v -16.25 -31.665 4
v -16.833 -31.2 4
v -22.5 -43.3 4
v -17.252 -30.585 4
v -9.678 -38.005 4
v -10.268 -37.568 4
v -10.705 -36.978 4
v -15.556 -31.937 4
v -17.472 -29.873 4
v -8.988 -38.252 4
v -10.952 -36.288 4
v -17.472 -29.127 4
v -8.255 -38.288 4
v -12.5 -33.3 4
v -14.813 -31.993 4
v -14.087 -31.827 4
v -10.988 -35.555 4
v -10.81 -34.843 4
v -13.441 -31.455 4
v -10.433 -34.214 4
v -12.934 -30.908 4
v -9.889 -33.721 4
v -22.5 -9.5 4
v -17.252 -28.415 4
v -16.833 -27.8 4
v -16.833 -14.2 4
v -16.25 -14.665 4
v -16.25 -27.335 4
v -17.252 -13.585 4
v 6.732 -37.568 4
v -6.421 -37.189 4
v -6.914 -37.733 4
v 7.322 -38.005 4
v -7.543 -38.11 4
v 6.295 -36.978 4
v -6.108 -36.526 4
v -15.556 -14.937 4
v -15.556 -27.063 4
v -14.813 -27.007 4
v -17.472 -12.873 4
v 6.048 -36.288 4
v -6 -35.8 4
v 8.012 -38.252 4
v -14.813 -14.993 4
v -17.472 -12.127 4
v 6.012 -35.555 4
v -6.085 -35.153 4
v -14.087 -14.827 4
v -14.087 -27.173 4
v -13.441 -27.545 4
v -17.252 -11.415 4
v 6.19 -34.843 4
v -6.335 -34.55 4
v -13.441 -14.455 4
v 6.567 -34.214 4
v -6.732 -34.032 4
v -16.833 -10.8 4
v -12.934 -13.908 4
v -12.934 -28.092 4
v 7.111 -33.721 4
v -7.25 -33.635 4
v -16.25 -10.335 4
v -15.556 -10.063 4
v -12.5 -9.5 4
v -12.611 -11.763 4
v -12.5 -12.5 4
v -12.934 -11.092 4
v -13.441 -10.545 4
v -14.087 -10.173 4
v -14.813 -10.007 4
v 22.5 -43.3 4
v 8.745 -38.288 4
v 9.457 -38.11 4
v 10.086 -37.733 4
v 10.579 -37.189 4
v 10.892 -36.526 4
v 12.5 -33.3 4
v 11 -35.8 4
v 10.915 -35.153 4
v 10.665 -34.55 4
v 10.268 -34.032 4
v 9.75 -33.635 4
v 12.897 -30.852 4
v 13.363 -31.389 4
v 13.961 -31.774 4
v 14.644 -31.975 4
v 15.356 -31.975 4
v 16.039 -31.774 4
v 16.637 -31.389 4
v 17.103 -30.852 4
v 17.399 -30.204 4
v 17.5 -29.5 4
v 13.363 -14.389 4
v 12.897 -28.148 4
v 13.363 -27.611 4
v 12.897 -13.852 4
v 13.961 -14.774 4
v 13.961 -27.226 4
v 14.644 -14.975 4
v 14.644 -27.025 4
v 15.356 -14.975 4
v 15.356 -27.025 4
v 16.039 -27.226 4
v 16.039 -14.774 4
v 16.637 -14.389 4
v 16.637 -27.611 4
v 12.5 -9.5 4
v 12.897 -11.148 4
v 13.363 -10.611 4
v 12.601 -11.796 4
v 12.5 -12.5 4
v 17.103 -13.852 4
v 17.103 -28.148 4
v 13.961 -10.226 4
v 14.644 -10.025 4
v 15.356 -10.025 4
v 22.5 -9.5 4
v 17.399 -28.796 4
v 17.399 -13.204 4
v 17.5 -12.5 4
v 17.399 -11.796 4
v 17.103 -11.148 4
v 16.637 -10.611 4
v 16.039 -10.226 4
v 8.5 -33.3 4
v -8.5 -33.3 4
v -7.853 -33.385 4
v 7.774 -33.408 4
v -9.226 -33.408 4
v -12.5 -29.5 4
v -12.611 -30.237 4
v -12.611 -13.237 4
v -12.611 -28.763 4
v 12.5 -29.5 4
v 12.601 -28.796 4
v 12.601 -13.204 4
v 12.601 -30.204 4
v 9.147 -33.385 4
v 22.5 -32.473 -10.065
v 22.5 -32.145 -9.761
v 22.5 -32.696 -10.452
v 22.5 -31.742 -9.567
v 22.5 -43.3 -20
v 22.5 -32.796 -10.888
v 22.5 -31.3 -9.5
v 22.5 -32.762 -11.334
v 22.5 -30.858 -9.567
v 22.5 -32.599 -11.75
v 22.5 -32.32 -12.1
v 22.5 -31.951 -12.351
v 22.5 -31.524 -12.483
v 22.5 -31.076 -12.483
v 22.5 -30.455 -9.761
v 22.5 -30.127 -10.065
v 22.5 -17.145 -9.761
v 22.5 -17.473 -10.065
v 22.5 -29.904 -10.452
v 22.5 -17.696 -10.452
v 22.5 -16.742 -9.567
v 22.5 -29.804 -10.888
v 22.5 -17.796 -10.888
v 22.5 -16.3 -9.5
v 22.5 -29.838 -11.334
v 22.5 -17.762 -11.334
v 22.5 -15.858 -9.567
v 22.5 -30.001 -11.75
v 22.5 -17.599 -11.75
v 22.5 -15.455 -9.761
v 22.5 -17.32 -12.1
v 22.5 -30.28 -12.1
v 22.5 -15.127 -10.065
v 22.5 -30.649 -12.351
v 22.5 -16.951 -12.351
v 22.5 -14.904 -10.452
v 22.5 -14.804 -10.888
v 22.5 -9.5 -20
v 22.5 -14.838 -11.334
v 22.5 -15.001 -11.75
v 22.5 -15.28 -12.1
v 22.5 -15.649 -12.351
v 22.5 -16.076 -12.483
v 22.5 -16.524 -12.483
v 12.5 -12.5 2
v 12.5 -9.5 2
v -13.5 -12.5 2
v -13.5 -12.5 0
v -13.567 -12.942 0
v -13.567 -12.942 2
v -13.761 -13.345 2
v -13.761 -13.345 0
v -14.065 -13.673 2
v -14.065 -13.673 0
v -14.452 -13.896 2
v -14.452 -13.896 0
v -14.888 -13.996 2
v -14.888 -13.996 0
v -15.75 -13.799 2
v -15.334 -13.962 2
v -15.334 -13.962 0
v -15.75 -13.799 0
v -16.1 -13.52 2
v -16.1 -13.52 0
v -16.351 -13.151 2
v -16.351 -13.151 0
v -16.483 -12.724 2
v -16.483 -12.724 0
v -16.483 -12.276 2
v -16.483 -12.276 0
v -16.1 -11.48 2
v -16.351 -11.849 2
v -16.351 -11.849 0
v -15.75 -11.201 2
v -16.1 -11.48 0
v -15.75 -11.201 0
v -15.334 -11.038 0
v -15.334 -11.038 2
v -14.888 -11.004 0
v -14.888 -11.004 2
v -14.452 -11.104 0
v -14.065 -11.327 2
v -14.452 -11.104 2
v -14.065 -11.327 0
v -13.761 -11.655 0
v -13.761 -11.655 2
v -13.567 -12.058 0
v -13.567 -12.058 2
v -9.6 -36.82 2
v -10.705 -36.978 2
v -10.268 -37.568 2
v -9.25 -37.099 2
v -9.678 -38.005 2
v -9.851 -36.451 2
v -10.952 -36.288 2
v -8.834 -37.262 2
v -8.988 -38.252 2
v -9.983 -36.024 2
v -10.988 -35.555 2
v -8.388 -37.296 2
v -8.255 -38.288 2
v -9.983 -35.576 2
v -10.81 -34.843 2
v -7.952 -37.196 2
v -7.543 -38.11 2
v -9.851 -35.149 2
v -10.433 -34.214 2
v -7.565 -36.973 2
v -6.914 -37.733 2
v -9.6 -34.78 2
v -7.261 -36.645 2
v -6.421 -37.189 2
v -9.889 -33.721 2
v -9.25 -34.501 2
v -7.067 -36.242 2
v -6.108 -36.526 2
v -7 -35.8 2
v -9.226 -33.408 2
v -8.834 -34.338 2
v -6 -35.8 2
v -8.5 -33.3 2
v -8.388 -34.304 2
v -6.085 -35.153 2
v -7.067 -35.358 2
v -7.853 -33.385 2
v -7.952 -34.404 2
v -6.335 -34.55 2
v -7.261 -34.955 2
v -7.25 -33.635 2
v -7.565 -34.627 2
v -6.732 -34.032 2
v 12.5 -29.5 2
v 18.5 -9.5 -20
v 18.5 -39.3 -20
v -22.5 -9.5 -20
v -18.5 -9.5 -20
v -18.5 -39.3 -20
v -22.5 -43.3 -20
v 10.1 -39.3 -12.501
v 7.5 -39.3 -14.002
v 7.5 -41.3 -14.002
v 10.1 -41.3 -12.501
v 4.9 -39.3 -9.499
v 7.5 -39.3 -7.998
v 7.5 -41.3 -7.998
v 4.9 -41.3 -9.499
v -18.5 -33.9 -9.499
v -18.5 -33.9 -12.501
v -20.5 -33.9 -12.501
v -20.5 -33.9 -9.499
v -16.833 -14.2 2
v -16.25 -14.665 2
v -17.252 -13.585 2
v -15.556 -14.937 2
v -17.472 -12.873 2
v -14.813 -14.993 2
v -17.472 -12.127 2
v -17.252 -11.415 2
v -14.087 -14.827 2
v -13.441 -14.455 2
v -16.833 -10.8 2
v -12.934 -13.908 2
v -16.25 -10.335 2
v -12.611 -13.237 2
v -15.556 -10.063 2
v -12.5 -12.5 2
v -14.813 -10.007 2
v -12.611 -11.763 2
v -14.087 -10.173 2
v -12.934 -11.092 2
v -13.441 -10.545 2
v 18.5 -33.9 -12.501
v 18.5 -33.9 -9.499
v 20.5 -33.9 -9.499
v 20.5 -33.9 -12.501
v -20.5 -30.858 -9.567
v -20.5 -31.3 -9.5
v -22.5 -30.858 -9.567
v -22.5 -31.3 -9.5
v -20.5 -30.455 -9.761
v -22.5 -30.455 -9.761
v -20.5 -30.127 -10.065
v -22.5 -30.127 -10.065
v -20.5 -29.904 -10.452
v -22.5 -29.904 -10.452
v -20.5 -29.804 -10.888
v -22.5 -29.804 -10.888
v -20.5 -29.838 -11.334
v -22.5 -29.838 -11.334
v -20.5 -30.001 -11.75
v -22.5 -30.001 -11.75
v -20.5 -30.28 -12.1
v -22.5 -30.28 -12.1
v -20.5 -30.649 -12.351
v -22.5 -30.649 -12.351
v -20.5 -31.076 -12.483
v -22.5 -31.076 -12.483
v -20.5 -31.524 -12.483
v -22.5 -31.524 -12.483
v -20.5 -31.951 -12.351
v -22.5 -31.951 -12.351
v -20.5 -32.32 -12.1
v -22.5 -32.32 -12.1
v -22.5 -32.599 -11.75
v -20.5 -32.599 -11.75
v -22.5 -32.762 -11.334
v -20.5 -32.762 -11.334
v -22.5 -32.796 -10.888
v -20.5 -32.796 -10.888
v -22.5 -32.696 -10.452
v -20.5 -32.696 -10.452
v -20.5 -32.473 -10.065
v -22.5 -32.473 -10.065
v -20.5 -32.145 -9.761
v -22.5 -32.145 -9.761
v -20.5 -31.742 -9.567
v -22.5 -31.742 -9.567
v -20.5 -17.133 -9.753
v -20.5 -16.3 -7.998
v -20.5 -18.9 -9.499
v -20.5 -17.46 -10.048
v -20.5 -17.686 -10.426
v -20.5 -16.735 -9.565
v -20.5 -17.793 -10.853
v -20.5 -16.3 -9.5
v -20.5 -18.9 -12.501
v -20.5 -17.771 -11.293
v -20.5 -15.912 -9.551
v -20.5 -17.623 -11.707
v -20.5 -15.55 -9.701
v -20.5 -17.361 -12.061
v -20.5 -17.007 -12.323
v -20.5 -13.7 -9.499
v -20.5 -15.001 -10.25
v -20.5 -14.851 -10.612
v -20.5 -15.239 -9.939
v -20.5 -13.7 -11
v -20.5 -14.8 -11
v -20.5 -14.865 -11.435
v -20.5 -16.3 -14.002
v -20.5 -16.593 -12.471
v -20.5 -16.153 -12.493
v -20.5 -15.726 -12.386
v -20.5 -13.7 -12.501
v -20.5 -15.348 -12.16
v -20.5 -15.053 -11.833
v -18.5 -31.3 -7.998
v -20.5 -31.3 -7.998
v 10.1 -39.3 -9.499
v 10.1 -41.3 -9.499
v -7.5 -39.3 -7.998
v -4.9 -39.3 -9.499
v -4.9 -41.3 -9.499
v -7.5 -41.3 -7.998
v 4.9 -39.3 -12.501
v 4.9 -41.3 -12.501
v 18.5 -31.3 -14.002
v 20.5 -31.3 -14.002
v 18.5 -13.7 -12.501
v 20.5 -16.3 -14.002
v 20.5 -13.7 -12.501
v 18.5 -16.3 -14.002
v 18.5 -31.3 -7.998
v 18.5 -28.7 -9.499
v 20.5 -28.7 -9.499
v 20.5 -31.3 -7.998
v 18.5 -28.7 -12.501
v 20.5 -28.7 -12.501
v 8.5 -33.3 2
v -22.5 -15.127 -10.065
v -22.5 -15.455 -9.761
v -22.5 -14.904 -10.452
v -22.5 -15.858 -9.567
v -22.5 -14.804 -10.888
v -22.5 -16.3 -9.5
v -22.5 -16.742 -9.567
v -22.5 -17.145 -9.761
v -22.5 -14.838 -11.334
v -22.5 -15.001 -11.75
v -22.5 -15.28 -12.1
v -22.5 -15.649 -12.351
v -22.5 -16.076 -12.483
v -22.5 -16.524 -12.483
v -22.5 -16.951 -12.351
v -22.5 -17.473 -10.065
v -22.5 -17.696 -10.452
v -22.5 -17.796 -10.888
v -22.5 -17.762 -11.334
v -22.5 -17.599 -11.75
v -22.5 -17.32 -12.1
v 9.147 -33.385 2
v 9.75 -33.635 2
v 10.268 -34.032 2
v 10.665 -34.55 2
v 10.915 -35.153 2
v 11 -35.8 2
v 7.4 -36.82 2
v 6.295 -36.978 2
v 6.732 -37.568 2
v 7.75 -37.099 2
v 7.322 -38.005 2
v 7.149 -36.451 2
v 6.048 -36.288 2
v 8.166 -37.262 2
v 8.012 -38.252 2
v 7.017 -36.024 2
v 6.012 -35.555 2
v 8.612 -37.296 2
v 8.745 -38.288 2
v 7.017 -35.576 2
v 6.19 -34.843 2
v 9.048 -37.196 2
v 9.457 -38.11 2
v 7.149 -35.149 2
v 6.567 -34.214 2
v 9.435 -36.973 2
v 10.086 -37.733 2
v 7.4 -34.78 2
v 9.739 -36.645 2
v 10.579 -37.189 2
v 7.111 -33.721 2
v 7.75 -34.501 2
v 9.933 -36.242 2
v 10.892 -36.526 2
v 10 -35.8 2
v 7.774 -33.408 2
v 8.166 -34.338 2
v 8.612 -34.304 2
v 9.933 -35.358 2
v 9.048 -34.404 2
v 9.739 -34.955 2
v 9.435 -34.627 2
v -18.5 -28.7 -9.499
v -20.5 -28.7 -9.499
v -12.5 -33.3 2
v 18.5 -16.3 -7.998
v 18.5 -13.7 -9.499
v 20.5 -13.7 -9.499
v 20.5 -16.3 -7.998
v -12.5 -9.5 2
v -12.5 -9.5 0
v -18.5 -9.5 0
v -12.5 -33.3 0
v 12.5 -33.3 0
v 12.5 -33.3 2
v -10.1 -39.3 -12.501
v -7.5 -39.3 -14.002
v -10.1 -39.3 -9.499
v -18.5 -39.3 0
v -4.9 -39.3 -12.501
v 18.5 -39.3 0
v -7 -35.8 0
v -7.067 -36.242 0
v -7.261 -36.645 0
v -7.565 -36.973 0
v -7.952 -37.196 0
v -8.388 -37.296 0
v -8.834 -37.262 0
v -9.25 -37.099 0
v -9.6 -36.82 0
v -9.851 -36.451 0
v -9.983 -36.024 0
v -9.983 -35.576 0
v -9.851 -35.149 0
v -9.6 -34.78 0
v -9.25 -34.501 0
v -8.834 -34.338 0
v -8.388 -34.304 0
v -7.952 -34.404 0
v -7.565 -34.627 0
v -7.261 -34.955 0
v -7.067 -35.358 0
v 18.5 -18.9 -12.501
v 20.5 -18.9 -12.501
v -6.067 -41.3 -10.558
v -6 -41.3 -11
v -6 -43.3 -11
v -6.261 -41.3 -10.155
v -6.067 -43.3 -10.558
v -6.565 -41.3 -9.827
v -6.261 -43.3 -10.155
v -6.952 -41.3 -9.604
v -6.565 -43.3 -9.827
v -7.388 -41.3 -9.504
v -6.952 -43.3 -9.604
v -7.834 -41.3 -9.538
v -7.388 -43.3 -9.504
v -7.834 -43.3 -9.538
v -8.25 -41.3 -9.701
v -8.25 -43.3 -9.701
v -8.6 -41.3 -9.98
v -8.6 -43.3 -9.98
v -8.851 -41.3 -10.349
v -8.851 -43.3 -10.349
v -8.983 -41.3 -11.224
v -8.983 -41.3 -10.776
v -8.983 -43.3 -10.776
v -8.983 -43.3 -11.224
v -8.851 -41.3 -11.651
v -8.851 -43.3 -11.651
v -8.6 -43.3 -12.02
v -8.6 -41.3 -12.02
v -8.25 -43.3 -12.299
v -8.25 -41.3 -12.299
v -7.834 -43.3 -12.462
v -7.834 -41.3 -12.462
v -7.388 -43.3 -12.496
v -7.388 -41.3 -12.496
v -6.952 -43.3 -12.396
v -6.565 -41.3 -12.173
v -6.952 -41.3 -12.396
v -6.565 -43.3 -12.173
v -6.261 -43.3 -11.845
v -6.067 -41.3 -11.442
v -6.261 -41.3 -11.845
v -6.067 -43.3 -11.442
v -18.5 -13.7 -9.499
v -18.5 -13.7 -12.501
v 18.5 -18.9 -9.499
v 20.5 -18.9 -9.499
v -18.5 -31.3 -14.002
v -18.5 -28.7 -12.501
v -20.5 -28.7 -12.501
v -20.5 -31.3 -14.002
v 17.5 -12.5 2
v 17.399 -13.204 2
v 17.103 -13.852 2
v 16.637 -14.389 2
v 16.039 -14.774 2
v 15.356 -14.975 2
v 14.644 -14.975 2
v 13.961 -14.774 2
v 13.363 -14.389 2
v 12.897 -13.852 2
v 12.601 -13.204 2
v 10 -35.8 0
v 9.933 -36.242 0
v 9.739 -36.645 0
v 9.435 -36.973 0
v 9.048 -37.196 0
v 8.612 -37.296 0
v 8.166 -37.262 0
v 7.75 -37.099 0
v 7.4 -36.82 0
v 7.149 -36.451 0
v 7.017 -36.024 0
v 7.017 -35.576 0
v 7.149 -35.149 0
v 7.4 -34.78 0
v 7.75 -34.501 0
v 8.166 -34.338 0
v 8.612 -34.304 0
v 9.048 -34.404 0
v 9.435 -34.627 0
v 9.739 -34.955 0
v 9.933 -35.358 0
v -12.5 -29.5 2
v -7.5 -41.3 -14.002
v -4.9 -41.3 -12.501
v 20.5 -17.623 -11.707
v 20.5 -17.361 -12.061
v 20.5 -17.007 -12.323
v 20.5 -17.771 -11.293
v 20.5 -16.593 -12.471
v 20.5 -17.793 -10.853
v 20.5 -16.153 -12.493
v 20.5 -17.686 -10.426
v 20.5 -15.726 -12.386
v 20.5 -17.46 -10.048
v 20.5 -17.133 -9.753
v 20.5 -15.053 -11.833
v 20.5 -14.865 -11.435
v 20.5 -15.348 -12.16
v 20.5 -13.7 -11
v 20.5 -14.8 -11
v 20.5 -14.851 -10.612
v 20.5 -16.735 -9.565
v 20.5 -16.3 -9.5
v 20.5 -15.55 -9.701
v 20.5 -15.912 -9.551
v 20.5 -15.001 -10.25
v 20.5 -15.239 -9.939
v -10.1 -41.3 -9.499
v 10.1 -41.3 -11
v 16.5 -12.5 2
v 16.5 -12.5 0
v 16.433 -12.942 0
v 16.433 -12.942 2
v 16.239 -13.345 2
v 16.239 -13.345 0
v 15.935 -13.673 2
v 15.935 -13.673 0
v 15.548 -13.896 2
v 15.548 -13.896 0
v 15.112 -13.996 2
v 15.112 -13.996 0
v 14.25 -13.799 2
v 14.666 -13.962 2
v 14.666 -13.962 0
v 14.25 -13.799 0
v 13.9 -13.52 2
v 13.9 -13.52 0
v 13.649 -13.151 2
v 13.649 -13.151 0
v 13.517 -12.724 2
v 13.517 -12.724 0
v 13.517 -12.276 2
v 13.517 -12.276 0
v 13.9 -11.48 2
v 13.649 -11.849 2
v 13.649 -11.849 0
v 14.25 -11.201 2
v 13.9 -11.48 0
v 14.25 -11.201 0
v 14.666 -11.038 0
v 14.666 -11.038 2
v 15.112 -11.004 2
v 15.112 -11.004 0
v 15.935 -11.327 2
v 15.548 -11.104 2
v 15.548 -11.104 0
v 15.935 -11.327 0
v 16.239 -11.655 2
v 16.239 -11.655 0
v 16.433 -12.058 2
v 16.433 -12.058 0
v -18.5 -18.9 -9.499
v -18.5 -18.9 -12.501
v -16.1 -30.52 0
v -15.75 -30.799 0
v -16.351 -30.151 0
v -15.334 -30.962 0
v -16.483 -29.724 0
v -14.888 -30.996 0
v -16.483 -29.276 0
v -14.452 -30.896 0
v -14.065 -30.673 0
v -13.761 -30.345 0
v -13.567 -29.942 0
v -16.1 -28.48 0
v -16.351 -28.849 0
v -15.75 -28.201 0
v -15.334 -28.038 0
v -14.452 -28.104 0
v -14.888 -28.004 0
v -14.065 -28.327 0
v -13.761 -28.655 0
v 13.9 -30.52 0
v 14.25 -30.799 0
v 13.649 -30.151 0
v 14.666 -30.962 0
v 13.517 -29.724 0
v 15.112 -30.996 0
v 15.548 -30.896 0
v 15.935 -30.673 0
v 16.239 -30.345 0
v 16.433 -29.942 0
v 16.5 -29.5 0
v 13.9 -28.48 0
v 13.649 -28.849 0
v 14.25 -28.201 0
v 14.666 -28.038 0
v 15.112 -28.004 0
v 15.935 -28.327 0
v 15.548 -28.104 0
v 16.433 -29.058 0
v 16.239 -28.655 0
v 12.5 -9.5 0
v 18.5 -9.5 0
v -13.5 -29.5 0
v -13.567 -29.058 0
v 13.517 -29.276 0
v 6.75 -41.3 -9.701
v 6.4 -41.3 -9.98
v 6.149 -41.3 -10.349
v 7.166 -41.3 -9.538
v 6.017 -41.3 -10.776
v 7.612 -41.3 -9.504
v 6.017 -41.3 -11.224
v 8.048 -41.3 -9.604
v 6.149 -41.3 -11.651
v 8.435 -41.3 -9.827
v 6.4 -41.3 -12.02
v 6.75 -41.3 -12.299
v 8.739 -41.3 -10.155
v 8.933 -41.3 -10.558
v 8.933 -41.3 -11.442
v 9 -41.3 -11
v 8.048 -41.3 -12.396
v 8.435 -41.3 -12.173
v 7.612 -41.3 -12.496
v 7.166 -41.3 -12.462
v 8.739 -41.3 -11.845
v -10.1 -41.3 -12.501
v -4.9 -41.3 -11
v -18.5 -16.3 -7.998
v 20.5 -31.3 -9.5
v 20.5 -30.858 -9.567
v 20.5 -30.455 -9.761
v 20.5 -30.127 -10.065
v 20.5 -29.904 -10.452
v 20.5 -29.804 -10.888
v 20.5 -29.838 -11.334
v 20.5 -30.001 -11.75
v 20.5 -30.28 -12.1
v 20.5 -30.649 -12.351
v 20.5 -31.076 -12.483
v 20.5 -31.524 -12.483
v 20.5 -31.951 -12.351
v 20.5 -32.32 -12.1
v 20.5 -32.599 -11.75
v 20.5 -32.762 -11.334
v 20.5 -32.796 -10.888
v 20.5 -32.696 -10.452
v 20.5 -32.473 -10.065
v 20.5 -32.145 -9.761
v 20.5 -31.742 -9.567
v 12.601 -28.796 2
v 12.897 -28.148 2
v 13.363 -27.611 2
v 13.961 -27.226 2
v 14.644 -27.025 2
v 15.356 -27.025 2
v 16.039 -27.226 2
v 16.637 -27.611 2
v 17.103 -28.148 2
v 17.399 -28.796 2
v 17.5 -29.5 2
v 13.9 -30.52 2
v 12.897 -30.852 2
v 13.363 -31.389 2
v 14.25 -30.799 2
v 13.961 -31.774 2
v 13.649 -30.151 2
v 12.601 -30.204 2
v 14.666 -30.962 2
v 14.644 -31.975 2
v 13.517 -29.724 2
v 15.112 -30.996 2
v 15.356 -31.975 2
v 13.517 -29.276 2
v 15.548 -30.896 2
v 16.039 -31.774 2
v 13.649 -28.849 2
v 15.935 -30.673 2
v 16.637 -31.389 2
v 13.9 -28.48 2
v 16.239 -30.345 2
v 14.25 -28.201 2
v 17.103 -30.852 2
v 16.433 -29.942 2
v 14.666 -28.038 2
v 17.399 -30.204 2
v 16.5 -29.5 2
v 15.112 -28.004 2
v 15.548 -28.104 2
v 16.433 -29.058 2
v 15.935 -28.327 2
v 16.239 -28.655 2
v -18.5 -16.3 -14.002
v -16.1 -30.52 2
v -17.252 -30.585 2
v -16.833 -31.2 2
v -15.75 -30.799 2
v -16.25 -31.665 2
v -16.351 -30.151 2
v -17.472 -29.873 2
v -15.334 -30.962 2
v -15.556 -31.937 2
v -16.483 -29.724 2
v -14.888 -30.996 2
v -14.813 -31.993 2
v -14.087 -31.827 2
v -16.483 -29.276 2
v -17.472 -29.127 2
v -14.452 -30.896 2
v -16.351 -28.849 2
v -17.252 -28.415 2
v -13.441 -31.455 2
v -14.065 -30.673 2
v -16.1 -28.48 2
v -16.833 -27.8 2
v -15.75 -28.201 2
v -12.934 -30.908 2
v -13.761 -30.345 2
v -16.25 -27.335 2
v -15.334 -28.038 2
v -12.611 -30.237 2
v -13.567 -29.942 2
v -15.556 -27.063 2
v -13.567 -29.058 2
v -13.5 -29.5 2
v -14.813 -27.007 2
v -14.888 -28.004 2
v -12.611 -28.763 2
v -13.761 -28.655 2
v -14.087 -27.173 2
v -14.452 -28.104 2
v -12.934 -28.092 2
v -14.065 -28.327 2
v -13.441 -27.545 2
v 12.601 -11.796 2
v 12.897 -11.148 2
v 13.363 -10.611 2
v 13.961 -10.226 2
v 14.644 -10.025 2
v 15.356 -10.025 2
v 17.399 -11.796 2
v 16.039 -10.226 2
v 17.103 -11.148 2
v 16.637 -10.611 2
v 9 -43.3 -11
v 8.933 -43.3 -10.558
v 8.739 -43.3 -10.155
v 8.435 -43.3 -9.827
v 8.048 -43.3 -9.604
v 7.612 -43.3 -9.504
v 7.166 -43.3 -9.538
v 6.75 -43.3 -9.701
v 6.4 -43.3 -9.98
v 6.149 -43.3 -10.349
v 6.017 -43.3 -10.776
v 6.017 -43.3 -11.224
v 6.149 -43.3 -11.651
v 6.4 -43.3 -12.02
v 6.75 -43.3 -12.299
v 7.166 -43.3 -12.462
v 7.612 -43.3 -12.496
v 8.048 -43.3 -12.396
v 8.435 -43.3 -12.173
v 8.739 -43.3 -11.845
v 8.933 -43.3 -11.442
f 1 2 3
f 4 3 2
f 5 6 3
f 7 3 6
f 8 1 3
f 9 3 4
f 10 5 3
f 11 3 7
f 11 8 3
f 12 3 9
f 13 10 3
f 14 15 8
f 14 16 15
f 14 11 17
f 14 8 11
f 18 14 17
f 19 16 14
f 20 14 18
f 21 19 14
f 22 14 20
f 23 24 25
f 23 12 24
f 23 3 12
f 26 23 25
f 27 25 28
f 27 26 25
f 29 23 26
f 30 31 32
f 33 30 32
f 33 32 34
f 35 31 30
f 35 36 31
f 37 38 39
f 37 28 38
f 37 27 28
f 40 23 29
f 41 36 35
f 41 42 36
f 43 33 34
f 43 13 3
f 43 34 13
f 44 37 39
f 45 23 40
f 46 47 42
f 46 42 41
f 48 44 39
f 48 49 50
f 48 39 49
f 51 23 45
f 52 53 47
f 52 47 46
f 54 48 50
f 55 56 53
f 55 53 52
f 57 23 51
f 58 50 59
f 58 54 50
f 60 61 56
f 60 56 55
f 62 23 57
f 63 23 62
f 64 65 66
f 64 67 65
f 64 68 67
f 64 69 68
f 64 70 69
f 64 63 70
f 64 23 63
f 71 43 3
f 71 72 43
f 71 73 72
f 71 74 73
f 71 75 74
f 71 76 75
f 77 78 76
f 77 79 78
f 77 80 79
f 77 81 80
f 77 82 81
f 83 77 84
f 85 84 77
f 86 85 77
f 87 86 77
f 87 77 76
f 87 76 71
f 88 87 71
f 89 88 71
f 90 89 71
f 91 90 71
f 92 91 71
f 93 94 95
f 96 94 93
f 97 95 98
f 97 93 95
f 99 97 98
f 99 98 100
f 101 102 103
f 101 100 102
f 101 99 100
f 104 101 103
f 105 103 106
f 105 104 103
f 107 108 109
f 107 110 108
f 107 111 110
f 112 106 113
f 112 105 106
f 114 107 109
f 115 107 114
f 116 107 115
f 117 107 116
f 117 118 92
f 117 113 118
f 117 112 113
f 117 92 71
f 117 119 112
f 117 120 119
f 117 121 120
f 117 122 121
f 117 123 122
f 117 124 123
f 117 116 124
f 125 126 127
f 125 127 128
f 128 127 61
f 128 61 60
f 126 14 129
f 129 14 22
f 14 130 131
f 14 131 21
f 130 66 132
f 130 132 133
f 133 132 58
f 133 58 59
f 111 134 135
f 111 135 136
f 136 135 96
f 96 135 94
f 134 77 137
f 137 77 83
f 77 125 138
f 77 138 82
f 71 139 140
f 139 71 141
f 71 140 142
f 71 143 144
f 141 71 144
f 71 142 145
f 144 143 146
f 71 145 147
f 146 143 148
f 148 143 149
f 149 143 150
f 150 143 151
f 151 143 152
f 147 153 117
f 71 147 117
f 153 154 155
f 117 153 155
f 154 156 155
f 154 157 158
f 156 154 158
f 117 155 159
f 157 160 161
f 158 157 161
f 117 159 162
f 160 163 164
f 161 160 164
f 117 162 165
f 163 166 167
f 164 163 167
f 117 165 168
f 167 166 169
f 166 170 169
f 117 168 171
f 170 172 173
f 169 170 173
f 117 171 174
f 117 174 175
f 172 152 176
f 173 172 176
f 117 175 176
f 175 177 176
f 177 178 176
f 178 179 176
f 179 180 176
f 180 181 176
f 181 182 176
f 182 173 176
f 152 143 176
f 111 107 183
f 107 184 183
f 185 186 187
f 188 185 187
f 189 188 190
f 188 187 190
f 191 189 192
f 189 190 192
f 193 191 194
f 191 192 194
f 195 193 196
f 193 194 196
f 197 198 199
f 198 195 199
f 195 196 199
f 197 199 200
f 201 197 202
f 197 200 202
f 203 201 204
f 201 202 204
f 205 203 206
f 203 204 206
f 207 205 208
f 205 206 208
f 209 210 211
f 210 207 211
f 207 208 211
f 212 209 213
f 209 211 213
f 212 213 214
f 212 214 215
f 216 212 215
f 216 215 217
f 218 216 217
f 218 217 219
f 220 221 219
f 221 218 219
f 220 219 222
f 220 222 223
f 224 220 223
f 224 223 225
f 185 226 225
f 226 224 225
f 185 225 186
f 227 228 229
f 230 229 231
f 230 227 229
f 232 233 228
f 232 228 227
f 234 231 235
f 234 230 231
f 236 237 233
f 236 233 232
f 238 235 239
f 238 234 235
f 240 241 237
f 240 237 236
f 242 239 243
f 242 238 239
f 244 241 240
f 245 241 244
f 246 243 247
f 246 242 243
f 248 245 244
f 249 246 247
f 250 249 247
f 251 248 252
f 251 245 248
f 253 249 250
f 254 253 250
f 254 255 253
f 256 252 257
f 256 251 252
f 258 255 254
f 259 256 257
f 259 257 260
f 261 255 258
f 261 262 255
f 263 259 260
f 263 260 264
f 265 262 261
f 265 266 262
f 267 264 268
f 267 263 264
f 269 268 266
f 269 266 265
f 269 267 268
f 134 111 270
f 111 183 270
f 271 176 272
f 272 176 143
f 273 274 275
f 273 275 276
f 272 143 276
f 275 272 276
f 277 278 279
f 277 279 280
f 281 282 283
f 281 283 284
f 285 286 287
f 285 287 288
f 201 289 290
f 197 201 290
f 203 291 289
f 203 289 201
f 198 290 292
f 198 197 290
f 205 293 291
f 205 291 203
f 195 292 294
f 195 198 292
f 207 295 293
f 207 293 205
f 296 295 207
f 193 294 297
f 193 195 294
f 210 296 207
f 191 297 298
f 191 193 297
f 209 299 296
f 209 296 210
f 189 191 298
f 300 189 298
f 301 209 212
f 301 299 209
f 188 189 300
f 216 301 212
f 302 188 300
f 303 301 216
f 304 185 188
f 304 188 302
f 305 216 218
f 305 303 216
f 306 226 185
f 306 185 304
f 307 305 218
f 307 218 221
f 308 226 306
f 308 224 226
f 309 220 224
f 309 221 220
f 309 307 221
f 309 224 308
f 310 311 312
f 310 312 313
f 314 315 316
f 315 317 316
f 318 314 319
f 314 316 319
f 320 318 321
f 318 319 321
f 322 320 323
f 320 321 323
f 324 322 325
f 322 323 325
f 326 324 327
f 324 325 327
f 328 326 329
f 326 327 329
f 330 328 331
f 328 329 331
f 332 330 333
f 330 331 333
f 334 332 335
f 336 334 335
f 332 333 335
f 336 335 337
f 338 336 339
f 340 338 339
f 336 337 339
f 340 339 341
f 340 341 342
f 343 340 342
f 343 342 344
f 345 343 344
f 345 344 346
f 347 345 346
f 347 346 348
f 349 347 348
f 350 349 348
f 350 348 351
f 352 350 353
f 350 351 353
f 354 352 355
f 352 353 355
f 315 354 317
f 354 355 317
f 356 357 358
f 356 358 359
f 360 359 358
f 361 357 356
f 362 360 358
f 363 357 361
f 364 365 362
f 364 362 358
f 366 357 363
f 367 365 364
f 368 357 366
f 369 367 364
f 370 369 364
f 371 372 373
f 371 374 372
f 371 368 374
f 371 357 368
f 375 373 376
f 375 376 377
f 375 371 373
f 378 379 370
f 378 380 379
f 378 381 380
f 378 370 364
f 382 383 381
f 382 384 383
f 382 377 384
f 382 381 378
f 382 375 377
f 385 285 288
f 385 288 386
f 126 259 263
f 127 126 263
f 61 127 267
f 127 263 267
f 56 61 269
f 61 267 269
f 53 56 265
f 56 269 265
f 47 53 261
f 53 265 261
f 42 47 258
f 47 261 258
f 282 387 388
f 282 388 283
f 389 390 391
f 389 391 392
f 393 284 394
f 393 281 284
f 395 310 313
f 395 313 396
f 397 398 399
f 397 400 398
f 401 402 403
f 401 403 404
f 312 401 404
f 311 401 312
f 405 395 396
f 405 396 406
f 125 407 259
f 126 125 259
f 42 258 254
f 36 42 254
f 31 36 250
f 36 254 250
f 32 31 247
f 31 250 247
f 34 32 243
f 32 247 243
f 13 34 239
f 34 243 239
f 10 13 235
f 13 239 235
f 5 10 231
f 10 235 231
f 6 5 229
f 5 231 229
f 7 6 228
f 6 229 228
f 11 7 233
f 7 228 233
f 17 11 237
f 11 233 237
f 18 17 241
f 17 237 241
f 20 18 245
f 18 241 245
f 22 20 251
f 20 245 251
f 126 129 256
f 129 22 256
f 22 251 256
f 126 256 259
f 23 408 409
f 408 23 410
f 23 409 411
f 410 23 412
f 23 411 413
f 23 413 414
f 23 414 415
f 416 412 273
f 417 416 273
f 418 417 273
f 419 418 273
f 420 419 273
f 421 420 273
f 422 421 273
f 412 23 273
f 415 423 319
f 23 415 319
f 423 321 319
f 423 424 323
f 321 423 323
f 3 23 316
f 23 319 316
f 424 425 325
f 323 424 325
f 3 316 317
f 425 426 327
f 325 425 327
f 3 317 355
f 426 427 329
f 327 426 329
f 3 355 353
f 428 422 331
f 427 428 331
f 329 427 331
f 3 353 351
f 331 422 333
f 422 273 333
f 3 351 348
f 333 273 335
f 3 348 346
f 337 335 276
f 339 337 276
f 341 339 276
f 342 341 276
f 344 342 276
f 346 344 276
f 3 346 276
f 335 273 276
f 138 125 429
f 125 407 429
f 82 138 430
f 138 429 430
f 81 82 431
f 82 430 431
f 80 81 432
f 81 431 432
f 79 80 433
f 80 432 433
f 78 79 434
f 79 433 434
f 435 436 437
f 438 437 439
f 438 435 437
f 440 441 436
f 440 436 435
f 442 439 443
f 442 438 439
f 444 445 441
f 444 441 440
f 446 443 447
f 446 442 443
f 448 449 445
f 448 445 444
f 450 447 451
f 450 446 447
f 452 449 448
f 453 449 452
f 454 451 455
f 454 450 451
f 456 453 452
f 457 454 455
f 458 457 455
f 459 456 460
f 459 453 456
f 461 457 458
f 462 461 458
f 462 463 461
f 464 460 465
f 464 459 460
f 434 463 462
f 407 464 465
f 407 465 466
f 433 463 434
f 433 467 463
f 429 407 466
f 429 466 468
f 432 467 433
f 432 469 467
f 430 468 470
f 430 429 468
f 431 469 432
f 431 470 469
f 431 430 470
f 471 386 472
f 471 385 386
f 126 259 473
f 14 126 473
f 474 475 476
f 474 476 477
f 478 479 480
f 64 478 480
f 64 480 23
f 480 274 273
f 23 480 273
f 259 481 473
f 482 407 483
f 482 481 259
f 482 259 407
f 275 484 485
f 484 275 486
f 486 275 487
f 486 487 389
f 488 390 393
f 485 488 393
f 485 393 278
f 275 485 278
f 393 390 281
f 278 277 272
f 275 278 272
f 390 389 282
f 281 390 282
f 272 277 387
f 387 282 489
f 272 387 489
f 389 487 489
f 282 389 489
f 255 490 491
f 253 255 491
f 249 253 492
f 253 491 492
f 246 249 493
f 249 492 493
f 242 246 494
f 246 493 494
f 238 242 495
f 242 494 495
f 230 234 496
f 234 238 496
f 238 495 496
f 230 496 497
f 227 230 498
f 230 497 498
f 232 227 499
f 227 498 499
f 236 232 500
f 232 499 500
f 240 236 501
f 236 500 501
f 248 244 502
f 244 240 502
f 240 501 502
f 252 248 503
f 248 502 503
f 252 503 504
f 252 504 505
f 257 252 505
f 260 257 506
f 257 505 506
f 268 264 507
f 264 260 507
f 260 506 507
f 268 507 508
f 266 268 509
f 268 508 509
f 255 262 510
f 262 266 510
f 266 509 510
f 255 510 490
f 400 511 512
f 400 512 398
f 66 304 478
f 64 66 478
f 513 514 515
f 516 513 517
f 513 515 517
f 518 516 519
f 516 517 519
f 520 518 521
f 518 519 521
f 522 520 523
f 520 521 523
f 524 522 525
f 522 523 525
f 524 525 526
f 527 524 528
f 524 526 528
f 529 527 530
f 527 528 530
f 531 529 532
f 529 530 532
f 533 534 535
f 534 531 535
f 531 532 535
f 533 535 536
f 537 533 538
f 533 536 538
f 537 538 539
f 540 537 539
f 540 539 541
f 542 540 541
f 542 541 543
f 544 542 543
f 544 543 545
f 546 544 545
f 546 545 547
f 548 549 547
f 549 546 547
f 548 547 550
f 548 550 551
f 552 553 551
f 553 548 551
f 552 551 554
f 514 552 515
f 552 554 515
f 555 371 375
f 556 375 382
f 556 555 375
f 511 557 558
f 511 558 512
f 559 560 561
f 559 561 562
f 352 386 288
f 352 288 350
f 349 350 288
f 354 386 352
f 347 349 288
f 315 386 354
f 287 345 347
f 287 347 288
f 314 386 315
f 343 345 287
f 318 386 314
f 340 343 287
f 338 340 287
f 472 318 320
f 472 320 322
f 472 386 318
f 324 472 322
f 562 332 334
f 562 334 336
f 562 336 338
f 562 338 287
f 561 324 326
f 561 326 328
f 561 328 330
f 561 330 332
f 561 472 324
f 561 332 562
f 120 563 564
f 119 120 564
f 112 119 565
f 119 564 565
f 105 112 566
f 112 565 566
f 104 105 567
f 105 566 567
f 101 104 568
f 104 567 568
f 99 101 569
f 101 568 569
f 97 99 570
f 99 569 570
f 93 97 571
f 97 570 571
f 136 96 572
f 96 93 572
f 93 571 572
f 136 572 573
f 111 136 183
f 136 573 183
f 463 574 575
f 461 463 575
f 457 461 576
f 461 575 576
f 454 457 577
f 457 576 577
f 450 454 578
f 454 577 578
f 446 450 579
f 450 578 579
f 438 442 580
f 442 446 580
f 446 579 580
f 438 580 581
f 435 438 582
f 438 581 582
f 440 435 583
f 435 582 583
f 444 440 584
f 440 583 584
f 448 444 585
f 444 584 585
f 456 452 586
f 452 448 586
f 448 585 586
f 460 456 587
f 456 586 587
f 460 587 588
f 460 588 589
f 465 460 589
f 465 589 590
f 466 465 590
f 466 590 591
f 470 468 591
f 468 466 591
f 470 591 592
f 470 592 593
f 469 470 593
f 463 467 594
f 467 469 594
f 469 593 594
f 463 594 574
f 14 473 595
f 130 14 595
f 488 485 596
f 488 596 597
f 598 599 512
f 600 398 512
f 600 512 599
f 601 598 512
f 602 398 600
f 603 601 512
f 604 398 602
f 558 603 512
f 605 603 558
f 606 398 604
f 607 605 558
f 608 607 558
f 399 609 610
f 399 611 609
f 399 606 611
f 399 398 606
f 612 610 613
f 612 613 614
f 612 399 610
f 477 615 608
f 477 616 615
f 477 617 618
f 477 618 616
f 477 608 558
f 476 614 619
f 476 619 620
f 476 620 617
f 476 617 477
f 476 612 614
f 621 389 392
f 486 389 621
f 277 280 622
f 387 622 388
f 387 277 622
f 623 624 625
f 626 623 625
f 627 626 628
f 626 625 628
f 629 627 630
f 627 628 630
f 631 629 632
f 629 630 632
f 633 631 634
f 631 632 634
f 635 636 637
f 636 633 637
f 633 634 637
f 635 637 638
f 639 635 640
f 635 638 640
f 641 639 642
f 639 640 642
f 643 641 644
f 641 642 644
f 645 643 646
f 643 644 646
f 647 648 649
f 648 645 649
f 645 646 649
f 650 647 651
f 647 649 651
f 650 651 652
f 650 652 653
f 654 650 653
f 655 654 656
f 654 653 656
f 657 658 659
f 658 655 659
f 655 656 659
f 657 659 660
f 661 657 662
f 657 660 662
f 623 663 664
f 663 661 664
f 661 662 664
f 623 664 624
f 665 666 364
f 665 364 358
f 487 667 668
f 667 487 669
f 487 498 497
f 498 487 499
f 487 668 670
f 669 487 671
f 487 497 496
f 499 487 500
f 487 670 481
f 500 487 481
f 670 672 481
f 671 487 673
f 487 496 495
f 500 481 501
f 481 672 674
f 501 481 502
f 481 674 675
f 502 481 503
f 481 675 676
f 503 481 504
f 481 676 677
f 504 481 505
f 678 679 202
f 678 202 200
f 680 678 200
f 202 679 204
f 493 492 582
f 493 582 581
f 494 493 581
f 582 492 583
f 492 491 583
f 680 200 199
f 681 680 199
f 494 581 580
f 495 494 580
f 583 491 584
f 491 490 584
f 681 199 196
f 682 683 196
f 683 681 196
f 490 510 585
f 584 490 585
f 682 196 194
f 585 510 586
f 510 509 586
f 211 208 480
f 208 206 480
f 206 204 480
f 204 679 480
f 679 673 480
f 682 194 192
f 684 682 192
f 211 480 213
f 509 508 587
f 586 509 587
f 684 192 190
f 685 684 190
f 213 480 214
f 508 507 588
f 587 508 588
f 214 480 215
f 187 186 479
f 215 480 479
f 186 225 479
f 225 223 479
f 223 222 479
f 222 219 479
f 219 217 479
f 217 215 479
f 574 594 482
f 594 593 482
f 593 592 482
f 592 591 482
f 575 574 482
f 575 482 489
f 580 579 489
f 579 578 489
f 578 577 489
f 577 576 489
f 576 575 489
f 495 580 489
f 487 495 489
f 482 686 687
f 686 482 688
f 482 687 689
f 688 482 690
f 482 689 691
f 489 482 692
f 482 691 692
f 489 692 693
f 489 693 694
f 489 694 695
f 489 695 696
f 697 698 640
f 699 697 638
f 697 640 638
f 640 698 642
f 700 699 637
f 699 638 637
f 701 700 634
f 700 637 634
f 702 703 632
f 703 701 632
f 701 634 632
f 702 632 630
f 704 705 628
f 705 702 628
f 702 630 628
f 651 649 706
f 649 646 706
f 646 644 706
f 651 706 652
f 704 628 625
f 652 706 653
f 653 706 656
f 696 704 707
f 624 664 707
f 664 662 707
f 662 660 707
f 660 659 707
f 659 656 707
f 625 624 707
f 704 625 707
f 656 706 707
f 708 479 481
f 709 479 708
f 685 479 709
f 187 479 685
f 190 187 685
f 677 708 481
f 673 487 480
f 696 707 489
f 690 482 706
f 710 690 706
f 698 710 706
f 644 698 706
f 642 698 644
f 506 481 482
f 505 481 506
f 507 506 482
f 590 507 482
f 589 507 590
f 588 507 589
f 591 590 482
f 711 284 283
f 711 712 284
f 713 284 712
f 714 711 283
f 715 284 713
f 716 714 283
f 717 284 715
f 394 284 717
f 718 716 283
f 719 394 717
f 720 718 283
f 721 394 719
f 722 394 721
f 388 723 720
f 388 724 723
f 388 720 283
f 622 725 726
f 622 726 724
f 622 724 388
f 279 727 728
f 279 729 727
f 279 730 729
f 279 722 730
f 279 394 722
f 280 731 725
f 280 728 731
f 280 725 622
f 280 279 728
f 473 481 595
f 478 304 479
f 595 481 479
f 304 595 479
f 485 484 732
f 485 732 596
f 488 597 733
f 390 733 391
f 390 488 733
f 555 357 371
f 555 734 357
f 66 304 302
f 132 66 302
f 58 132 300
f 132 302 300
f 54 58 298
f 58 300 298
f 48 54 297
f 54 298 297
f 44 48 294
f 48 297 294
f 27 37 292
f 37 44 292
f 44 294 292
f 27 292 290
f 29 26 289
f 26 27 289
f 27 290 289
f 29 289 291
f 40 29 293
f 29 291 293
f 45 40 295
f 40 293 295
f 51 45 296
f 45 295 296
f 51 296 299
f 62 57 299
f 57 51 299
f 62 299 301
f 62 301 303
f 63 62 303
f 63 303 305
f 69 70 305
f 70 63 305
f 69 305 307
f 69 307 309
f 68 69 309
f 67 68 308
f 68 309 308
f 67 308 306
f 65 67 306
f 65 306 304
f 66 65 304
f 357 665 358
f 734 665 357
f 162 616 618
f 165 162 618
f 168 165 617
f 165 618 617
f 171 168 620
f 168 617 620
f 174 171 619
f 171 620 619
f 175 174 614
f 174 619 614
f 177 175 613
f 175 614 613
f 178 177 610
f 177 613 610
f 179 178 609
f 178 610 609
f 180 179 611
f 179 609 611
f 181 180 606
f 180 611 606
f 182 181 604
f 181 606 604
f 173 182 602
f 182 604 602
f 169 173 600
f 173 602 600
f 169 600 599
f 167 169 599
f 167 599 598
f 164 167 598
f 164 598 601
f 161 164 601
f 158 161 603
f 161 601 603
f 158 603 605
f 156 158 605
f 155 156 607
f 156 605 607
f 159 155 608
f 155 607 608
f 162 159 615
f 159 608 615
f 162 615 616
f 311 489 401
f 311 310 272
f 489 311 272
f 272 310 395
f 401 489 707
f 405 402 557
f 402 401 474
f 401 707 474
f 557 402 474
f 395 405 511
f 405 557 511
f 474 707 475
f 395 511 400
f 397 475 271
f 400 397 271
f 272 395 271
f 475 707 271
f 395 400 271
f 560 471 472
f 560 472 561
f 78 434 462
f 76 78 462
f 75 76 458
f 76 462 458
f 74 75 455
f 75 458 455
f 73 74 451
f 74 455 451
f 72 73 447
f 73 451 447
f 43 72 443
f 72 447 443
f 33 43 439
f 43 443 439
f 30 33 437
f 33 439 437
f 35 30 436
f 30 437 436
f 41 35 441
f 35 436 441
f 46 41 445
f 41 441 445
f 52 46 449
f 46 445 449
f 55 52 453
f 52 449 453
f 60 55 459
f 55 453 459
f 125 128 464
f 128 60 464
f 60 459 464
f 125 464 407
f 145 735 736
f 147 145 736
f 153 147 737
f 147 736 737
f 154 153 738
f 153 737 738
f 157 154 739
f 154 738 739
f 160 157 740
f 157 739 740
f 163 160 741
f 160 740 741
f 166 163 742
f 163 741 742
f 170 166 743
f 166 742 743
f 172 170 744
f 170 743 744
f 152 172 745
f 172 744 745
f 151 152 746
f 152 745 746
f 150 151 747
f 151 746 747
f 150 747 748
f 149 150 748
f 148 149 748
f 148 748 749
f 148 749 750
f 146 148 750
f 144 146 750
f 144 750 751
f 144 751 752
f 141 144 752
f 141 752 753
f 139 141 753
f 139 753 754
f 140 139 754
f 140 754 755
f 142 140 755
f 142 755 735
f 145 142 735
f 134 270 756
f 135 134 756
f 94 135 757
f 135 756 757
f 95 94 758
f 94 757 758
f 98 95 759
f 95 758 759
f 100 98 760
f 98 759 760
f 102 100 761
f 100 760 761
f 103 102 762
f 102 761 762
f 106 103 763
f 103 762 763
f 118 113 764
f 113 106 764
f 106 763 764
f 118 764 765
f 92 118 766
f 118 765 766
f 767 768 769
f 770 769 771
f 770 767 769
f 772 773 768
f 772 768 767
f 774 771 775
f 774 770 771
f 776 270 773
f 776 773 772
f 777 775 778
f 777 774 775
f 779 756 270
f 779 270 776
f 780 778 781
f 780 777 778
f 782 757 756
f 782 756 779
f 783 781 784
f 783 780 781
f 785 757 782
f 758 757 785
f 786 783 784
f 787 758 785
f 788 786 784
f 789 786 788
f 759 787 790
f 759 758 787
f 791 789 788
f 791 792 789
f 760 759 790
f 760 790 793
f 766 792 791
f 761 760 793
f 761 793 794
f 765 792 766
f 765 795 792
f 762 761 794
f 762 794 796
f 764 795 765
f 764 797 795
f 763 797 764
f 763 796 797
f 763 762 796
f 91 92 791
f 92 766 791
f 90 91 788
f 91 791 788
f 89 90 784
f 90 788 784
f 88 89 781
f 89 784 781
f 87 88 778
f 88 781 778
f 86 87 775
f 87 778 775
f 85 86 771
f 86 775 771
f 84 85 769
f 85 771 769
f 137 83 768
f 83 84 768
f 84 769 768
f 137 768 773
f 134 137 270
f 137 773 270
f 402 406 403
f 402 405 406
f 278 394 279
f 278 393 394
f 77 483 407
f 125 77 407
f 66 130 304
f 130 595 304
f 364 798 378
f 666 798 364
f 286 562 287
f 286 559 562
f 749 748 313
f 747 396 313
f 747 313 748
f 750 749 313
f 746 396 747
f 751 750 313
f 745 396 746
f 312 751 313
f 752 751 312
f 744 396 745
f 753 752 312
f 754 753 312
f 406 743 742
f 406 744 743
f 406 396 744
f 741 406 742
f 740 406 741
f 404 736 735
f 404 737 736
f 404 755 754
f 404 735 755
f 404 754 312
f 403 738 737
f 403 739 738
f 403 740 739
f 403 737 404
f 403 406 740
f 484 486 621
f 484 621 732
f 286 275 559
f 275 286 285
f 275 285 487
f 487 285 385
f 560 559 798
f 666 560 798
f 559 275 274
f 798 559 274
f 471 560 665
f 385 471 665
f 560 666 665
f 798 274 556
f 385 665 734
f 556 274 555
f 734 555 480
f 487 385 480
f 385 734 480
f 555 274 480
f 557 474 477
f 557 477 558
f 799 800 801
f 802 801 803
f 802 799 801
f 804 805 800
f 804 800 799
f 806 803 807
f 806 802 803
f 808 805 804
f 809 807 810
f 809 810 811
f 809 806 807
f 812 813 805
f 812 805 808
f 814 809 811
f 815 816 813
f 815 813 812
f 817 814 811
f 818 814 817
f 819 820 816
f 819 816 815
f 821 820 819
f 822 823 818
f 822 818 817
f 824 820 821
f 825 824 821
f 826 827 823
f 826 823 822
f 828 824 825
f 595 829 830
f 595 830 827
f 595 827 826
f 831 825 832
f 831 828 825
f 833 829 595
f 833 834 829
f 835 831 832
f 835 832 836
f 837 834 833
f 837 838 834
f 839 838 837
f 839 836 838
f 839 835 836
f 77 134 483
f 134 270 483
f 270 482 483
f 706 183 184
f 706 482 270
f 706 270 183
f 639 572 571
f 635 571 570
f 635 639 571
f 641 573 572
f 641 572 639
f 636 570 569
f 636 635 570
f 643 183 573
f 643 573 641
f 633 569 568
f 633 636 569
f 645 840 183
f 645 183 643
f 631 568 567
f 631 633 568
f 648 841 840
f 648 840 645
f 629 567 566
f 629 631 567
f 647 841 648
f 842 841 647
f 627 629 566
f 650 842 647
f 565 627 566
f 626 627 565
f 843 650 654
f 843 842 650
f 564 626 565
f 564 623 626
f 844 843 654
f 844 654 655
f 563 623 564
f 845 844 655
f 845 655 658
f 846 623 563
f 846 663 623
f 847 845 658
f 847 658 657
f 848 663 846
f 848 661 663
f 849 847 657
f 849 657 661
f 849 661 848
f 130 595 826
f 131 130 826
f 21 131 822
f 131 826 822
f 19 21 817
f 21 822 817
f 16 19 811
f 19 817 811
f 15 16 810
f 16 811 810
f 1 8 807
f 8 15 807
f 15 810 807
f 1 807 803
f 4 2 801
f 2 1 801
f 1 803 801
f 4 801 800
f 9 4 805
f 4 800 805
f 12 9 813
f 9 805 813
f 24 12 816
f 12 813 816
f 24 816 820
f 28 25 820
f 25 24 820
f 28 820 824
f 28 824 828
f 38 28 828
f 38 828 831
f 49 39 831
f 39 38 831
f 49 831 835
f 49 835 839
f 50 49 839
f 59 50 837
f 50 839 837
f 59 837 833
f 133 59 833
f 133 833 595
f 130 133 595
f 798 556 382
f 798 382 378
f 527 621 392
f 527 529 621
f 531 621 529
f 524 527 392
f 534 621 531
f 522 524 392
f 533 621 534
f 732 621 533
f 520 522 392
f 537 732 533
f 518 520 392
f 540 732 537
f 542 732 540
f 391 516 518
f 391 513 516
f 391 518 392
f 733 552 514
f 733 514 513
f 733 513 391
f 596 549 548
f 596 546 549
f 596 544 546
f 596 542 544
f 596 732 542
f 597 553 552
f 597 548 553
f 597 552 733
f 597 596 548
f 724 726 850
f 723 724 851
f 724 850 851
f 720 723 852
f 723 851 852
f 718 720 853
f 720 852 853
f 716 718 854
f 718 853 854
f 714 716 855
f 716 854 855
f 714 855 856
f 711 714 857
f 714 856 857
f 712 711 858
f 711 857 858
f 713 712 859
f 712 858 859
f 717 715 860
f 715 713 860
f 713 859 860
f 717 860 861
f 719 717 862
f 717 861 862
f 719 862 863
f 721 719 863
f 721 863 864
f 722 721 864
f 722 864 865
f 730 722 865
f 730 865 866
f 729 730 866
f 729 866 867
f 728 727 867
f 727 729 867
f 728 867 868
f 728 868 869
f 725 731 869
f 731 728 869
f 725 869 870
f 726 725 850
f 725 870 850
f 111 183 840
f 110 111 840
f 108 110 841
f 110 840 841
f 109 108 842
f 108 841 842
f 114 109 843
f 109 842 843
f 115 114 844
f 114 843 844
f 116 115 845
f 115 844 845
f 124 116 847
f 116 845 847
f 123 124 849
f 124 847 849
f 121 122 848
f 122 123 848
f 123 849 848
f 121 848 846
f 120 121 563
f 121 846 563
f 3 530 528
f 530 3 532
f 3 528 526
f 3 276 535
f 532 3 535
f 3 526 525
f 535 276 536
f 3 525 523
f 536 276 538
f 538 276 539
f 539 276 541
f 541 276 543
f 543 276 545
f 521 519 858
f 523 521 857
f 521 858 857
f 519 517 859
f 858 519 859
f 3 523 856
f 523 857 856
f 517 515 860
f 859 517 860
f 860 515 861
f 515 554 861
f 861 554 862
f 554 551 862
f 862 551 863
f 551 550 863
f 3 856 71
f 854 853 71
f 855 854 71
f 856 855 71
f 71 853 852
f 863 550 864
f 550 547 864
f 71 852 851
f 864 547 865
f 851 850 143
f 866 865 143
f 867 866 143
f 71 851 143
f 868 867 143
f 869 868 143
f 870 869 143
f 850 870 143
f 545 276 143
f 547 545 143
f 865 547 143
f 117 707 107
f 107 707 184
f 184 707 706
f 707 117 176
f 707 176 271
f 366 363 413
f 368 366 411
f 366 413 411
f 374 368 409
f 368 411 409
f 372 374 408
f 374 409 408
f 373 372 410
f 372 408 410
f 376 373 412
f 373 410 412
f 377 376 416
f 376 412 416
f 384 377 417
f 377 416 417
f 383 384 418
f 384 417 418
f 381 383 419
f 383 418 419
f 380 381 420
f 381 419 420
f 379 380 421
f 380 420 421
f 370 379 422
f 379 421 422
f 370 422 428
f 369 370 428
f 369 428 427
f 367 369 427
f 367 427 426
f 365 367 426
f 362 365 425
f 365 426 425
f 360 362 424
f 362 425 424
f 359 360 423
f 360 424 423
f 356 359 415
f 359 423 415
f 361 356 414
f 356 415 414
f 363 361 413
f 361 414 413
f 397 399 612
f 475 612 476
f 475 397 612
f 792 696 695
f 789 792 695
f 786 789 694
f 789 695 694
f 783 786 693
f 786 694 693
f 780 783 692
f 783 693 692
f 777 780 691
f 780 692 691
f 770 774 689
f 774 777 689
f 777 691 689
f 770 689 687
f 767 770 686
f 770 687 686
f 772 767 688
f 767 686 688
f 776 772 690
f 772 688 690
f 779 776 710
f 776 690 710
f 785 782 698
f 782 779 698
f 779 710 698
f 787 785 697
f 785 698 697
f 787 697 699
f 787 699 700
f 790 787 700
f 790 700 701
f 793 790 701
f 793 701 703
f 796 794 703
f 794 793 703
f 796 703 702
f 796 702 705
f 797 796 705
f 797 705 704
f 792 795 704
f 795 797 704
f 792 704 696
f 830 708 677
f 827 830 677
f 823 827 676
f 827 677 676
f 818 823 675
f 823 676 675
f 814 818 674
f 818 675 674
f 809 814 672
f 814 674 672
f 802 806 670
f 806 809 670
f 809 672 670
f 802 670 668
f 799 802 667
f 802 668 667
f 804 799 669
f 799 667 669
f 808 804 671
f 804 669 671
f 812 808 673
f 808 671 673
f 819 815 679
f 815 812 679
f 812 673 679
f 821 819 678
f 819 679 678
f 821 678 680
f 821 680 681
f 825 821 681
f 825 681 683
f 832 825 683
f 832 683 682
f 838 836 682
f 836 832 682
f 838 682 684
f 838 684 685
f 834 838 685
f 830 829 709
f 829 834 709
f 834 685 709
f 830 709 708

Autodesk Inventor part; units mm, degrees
ref_plane "YZ Plane" through (0, 0, 0) normal (1, 0, 0) x (0, 1, 0)
ref_plane "Work Plane1" through (0, 0, 0) normal (0, 0, 1) x (1, 0, 0)
sketch "Sketch1" plane through (0, 0, 0) normal (0, 0, 1) x (1, 0, 0)
  line L0 (-12.7, 12) -> (-9.2, 12) construction
  line L1 (-12.7, 12) -> (-17.8, 6) construction
  line L2 (-17.8, 6) -> (-17.8, -32.6) construction
  line L3 (-17.8, -32.6) -> (-12.7, -38.6) construction
  line L4 (-12.7, -38.6) -> (12.7, -38.6) construction
  line L5 (12.7, -38.6) -> (17.8, -32.6) construction
  line L6 (17.8, -32.6) -> (17.8, 6) construction
  line L7 (17.8, 6) -> (12.7, 12) construction
  line L8 (9.2, 12) -> (12.7, 12) construction
  arc A0 (12.2, 9) -> (9.2, 12) centre (9.2, 9) ccw construction
  line L9 (12.2, -30) -> (12.2, 9) construction
  arc A1 (9.2, -33) -> (12.2, -30) centre (9.2, -30) ccw construction
  line L10 (-9.2, -33) -> (9.2, -33) construction
  arc A2 (-12.2, -30) -> (-9.2, -33) centre (-9.2, -30) ccw construction
  line L11 (-12.2, 9) -> (-12.2, -30) construction
  arc A3 (-9.2, 12) -> (-12.2, 9) centre (-9.2, 9) ccw construction
  circle A4 centre (-15, 4.5) radius 1.35 construction
  circle A5 centre (-15, -12.5) radius 1.35 construction
  circle A6 centre (-8.5, -35.8) radius 1.35 construction
  circle A7 centre (15, 4.5) radius 1.35 construction
  circle A8 centre (15, -12.5) radius 1.35 construction
  circle A9 centre (8.5, -35.8) radius 1.35 construction
  circle A10 centre (-15, -29.5) radius 1.35 construction
  circle A11 centre (15, -29.5) radius 1.35 construction
  line L12 (-15, -12.5) -> (-12.5, -12.5) construction
  line L13 (-12.5, -12.5) -> (-12.5, -9.5) construction
  line L14 (-12.5, -9.5) -> (-15, -9.5) construction
  line L15 (-15, -9.5) -> (-15, -12.5) construction
  line L16 (15, -12.5) -> (12.5, -12.5) construction
  line L17 (12.5, -12.5) -> (12.5, -9.5) construction
  line L18 (12.5, -9.5) -> (15, -9.5) construction
  line L19 (15, -9.5) -> (15, -12.5) construction
  line L20 (-8.5, -35.8) -> (-12.5, -35.8) construction
  line L21 (-12.5, -35.8) -> (-12.5, -33.3) construction
  line L22 (-12.5, -33.3) -> (-8.5, -33.3) construction
  line L23 (-8.5, -33.3) -> (-8.5, -35.8) construction
  line L24 (8.5, -35.8) -> (12.5, -35.8) construction
  line L25 (12.5, -35.8) -> (12.5, -33.3) construction
  line L26 (12.5, -33.3) -> (8.5, -33.3) construction
  line L27 (8.5, -33.3) -> (8.5, -35.8) construction
  line L28 (-12.5, -9.5) -> (-22.5, -9.5)
  line L29 (-22.5, -9.5) -> (-22.5, -33.3)
  line L30 (-22.5, -33.3) -> (-12.5, -33.3)
  line L31 (-12.5, -33.3) -> (-12.5, -9.5)
  line L32 (12.5, -9.5) -> (22.5, -9.5)
  line L33 (22.5, -9.5) -> (22.5, -33.3)
  line L34 (22.5, -33.3) -> (12.5, -33.3)
  line L35 (12.5, -33.3) -> (12.5, -9.5)
  line L36 (-22.5, -33.3) -> (22.5, -33.3)
  line L37 (22.5, -33.3) -> (22.5, -43.3)
  line L38 (22.5, -43.3) -> (-22.5, -43.3)
  line L39 (-22.5, -43.3) -> (-22.5, -33.3)
  circle A12 centre (-15, -12.5) radius 1.5
  circle A13 centre (-15, -29.5) radius 1.5
  circle A14 centre (-8.5, -35.8) radius 1.5
  circle A15 centre (8.5, -35.8) radius 1.5
  circle A16 centre (15, -29.5) radius 1.5
  circle A17 centre (15, -12.5) radius 1.5
  point P0 (0, 0)
  dimension "d0" = 2.5
  dimension "d1" = 3
  dimension "d2" = 2.5
  dimension "d3" = 3
  dimension "d4" = 4
  dimension "d5" = 2.5
  dimension "d6" = 4
  dimension "d7" = 2.5
  dimension "d9" = 10
  dimension "d10" = 10
  dimension "d11" = 10
  dimension "d12" = 3
  dimension "d13" = 3
  dimension "d14" = 3
  dimension "d15" = 3
  dimension "d16" = 3
  dimension "d17" = 3
extrude "Extrusion1" add sketch "Sketch1" along normal blind 2
sketch "Sketch2" plane through (-22.5, -43.3, 0) normal (0, -1, 0) x (1, 0, 0)
  line L0 (0, 0) -> (45, 0) projected
  line L1 (45, 0) -> (45, 2) projected
  line L2 (0, 2) -> (45, 2) projected
  line L3 (0, 0) -> (0, 2) projected
  line L4 (0, 0) -> (45, 0)
  line L5 (45, 0) -> (45, -20)
  line L6 (45, -20) -> (0, -20)
  line L7 (0, -20) -> (0, 0)
  point P0 (22.5, 0)
  dimension "d20" = 20
extrude "Extrusion2" add sketch "Sketch2" against normal blind 4
ref_plane "Work Plane2" through (0, -43.3, 2) normal (-1, 0, 0) x (0, 0, 1)
sketch "Sketch3" plane through (-22.5, -43.3, 2) normal (-1, 0, 0) x (0, 0, 1)
  line L0 (0, 33.8) -> (0, 0) projected
  line L1 (-2, 33.8) -> (0, 33.8) projected
  line L2 (-2, 33.8) -> (-2, 4) projected
  line L3 (-22, 4) -> (-2, 4) projected
  line L4 (-22, 0) -> (-22, 4) projected
  line L5 (-22, 0) -> (0, 0) projected
  line L6 (-2, 33.8) -> (-2, 4) projected
  line L7 (-2, 4) -> (-22, 4)
  line L8 (-22, 4) -> (-22, 33.8)
  line L9 (-22, 33.8) -> (-2, 33.8)
  line L10 (-2, 33.8) -> (-2, 4)
  point P0 (-2, 43.3)
extrude "Extrusion3" add sketch "Sketch3" against normal blind 4
mirror "Mirror1" about plane through (0, -43.3, 2) normal (-1, 0, 0) of "Extrusion3"
sketch "Sketch4" plane through (0, 0, 2) normal (0, 0, 1) x (1, 0, 0)
  line L0 (22.5, -9.5) -> (12.5, -9.5) projected
  line L1 (12.5, -9.5) -> (12.5, -33.3) projected
  line L2 (12.5, -33.3) -> (-12.5, -33.3) projected
  line L3 (-12.5, -33.3) -> (-12.5, -9.5) projected
  line L4 (-12.5, -9.5) -> (-22.5, -9.5) projected
  line L5 (-22.5, -9.5) -> (-22.5, -43.3) projected
  line L6 (-22.5, -43.3) -> (22.5, -43.3) projected
  line L7 (22.5, -43.3) -> (22.5, -9.5) projected
  circle A0 centre (8.5, -35.8) radius 1.5 projected
  circle A1 centre (-8.5, -35.8) radius 1.5 projected
  circle A2 centre (15, -12.5) radius 1.5 projected
  circle A3 centre (15, -29.5) radius 1.5 projected
  circle A4 centre (-15, -29.5) radius 1.5 projected
  circle A5 centre (-15, -12.5) radius 1.5 projected
  circle A6 centre (8.5, -35.8) radius 2.5
  circle A7 centre (15, -29.5) radius 1.5 projected
  circle A8 centre (15, -29.5) radius 2.5
  circle A9 centre (15, -12.5) radius 2.5
  circle A10 centre (-8.5, -35.8) radius 2.5
  circle A11 centre (-15, -29.5) radius 1.5 projected
  circle A12 centre (-15, -29.5) radius 2.5
  circle A13 centre (-15, -12.5) radius 2.5
  point P0 (0, 0)
  dimension "d25" = 5
  dimension "d26" = 5
  dimension "d27" = 5
  dimension "d28" = 5
  dimension "d29" = 5
  dimension "d30" = 5
extrude "Extrusion4" add sketch "Sketch4" along normal blind 2 contours L7 L6 L5 L4 L3 L2 L1 L0
sketch "Sketch5" plane through (-22.5, -43.3, -20) normal (0, -1, 0) x (1, 0, 0)
  line L0 (0, 0) -> (0, 24) construction
  line L1 (0, 0) -> (45, 0) construction
  line L2 (45, 0) -> (45, 24) construction
  line L3 (0, 24) -> (45, 24) construction
  line L4 (0, 24) -> (15, 24) construction
  line L5 (15, 24) -> (15, 9) construction
  line L6 (15, 9) -> (0, 9) construction
  line L7 (0, 9) -> (0, 24) construction
  line L8 (15, 9) -> (30, 9) construction
  circle A0 centre (15, 9) radius 1.5
  circle A1 centre (30, 9) radius 1.5
  point P0 (22.5, 20)
  dimension "d33" = 15
  dimension "d34" = 15
  dimension "d35" = 15
  dimension "d36" = 3
  dimension "d37" = 3
extrude "Extrusion5" cut sketch "Sketch5" against normal through all
sketch "Sketch6" plane through (-22.5, -39.3, 0) normal (0, 1, 0) x (1, 0, 0)
  circle A0 centre (15, 11) radius 1.5 projected
  circle A1 centre (30, 11) radius 1.5 projected
  line L0 (41, 0) -> (41, 20) projected
  line L1 (41, 20) -> (4, 20) projected
  line L2 (4, 20) -> (4, 0) projected
  line L3 (41, 0) -> (4, 0) projected
  line L4 (15, 11) -> (17.6, 11)
  line L5 (17.6, 9.4989) -> (15, 7.9978)
  line L6 (15, 7.9978) -> (12.4, 9.4989)
  line L7 (12.4, 9.4989) -> (12.4, 12.5011)
  line L8 (12.4, 12.5011) -> (15, 14.0022)
  line L9 (15, 14.0022) -> (17.6, 12.5011)
  line L10 (17.6, 12.5011) -> (17.6, 9.4989)
  line L11 (30, 11) -> (32.6, 11)
  line L12 (32.6, 9.4989) -> (30, 7.9978)
  line L13 (30, 7.9978) -> (27.4, 9.4989)
  line L14 (27.4, 9.4989) -> (27.4, 12.5011)
  line L15 (27.4, 12.5011) -> (30, 14.0022)
  line L16 (30, 14.0022) -> (32.6, 12.5011)
  line L17 (32.6, 12.5011) -> (32.6, 9.4989)
  point P0 (22.5, 0)
  dimension "d40" = 2.6
  dimension "d41" = 2.6
extrude "Extrusion6" cut sketch "Sketch6" against normal blind 2 contours L10 L5 L6 L7 L8 L9 | L17 L12 L13 L14 L15 L16
sketch "Sketch7" plane through (-22.5, -43.3, -20) normal (-1, 0, 0) x (0, 0, 1)
  line L0 (0, 33.8) -> (24, 33.8) construction
  line L1 (0, 0) -> (0, 33.8) construction
  line L2 (0, 0) -> (24, 0) construction
  line L3 (24, 33.8) -> (24, 0) construction
  line L4 (0, 33.8) -> (10, 33.8) construction
  line L5 (10, 33.8) -> (10, 28.8) construction
  line L6 (10, 28.8) -> (0, 28.8) construction
  line L7 (0, 28.8) -> (0, 33.8) construction
  line L8 (0, 0) -> (0, 33.8) construction
  line L9 (0, 0) -> (9, 0) construction
  line L10 (9, 0) -> (9, 12) construction
  line L11 (9, 12) -> (0, 12) construction
  line L12 (0, 12) -> (0, 0) construction
  line L13 (9, 12) -> (9, 27) construction
  circle A0 centre (9, 27) radius 1.5
  circle A1 centre (9, 12) radius 1.5
  point P0 (20, 43.3)
  dimension "d44" = 10
  dimension "d45" = 5
  dimension "d46" = 9
  dimension "d47" = 12
  dimension "d48" = 15
  dimension "d49" = 3
  dimension "d50" = 3
extrude "Extrusion7" cut sketch "Sketch7" against normal through all
sketch "Sketch8" plane through (-18.5, -43.3, 2) normal (1, 0, 0) x (0, 0, -1)
  circle A0 centre (13, 27) radius 1.5 construction
  circle A1 centre (13, 12) radius 1.5 construction
  line L0 (22, 4) -> (2, 4) construction
  line L1 (22, 4) -> (22, 33.8) construction
  line L2 (22, 33.8) -> (2, 33.8) construction
  line L3 (2, 4) -> (2, 33.8) construction
  line L4 (13, 12) -> (13, 14.6) construction
  line L5 (14.5011, 14.6) -> (16.0022, 12)
  line L6 (16.0022, 12) -> (14.5011, 9.4)
  line L7 (14.5011, 9.4) -> (11.4989, 9.4)
  line L8 (11.4989, 9.4) -> (9.9978, 12)
  line L9 (9.9978, 12) -> (11.4989, 14.6)
  line L10 (11.4989, 14.6) -> (14.5011, 14.6)
  circle A2 centre (13, 27) radius 1.5 projected
  line L11 (13, 27) -> (13, 29.6)
  line L12 (14.5011, 29.6) -> (16.0022, 27)
  line L13 (16.0022, 27) -> (14.5011, 24.4)
  line L14 (14.5011, 24.4) -> (11.4989, 24.4)
  line L15 (11.4989, 24.4) -> (9.9978, 27)
  line L16 (9.9978, 27) -> (11.4989, 29.6)
  line L17 (11.4989, 29.6) -> (14.5011, 29.6)
  point P0 (2, 43.3)
  dimension "d53" = 2.6
  dimension "d54" = 2.6
extrude "Extrusion8" cut sketch "Sketch8" against normal blind 2
mirror "Mirror2" about plane through (0, -43.3, 2) normal (-1, 0, 0) of "Extrusion8"
properties part number "april_tag"
